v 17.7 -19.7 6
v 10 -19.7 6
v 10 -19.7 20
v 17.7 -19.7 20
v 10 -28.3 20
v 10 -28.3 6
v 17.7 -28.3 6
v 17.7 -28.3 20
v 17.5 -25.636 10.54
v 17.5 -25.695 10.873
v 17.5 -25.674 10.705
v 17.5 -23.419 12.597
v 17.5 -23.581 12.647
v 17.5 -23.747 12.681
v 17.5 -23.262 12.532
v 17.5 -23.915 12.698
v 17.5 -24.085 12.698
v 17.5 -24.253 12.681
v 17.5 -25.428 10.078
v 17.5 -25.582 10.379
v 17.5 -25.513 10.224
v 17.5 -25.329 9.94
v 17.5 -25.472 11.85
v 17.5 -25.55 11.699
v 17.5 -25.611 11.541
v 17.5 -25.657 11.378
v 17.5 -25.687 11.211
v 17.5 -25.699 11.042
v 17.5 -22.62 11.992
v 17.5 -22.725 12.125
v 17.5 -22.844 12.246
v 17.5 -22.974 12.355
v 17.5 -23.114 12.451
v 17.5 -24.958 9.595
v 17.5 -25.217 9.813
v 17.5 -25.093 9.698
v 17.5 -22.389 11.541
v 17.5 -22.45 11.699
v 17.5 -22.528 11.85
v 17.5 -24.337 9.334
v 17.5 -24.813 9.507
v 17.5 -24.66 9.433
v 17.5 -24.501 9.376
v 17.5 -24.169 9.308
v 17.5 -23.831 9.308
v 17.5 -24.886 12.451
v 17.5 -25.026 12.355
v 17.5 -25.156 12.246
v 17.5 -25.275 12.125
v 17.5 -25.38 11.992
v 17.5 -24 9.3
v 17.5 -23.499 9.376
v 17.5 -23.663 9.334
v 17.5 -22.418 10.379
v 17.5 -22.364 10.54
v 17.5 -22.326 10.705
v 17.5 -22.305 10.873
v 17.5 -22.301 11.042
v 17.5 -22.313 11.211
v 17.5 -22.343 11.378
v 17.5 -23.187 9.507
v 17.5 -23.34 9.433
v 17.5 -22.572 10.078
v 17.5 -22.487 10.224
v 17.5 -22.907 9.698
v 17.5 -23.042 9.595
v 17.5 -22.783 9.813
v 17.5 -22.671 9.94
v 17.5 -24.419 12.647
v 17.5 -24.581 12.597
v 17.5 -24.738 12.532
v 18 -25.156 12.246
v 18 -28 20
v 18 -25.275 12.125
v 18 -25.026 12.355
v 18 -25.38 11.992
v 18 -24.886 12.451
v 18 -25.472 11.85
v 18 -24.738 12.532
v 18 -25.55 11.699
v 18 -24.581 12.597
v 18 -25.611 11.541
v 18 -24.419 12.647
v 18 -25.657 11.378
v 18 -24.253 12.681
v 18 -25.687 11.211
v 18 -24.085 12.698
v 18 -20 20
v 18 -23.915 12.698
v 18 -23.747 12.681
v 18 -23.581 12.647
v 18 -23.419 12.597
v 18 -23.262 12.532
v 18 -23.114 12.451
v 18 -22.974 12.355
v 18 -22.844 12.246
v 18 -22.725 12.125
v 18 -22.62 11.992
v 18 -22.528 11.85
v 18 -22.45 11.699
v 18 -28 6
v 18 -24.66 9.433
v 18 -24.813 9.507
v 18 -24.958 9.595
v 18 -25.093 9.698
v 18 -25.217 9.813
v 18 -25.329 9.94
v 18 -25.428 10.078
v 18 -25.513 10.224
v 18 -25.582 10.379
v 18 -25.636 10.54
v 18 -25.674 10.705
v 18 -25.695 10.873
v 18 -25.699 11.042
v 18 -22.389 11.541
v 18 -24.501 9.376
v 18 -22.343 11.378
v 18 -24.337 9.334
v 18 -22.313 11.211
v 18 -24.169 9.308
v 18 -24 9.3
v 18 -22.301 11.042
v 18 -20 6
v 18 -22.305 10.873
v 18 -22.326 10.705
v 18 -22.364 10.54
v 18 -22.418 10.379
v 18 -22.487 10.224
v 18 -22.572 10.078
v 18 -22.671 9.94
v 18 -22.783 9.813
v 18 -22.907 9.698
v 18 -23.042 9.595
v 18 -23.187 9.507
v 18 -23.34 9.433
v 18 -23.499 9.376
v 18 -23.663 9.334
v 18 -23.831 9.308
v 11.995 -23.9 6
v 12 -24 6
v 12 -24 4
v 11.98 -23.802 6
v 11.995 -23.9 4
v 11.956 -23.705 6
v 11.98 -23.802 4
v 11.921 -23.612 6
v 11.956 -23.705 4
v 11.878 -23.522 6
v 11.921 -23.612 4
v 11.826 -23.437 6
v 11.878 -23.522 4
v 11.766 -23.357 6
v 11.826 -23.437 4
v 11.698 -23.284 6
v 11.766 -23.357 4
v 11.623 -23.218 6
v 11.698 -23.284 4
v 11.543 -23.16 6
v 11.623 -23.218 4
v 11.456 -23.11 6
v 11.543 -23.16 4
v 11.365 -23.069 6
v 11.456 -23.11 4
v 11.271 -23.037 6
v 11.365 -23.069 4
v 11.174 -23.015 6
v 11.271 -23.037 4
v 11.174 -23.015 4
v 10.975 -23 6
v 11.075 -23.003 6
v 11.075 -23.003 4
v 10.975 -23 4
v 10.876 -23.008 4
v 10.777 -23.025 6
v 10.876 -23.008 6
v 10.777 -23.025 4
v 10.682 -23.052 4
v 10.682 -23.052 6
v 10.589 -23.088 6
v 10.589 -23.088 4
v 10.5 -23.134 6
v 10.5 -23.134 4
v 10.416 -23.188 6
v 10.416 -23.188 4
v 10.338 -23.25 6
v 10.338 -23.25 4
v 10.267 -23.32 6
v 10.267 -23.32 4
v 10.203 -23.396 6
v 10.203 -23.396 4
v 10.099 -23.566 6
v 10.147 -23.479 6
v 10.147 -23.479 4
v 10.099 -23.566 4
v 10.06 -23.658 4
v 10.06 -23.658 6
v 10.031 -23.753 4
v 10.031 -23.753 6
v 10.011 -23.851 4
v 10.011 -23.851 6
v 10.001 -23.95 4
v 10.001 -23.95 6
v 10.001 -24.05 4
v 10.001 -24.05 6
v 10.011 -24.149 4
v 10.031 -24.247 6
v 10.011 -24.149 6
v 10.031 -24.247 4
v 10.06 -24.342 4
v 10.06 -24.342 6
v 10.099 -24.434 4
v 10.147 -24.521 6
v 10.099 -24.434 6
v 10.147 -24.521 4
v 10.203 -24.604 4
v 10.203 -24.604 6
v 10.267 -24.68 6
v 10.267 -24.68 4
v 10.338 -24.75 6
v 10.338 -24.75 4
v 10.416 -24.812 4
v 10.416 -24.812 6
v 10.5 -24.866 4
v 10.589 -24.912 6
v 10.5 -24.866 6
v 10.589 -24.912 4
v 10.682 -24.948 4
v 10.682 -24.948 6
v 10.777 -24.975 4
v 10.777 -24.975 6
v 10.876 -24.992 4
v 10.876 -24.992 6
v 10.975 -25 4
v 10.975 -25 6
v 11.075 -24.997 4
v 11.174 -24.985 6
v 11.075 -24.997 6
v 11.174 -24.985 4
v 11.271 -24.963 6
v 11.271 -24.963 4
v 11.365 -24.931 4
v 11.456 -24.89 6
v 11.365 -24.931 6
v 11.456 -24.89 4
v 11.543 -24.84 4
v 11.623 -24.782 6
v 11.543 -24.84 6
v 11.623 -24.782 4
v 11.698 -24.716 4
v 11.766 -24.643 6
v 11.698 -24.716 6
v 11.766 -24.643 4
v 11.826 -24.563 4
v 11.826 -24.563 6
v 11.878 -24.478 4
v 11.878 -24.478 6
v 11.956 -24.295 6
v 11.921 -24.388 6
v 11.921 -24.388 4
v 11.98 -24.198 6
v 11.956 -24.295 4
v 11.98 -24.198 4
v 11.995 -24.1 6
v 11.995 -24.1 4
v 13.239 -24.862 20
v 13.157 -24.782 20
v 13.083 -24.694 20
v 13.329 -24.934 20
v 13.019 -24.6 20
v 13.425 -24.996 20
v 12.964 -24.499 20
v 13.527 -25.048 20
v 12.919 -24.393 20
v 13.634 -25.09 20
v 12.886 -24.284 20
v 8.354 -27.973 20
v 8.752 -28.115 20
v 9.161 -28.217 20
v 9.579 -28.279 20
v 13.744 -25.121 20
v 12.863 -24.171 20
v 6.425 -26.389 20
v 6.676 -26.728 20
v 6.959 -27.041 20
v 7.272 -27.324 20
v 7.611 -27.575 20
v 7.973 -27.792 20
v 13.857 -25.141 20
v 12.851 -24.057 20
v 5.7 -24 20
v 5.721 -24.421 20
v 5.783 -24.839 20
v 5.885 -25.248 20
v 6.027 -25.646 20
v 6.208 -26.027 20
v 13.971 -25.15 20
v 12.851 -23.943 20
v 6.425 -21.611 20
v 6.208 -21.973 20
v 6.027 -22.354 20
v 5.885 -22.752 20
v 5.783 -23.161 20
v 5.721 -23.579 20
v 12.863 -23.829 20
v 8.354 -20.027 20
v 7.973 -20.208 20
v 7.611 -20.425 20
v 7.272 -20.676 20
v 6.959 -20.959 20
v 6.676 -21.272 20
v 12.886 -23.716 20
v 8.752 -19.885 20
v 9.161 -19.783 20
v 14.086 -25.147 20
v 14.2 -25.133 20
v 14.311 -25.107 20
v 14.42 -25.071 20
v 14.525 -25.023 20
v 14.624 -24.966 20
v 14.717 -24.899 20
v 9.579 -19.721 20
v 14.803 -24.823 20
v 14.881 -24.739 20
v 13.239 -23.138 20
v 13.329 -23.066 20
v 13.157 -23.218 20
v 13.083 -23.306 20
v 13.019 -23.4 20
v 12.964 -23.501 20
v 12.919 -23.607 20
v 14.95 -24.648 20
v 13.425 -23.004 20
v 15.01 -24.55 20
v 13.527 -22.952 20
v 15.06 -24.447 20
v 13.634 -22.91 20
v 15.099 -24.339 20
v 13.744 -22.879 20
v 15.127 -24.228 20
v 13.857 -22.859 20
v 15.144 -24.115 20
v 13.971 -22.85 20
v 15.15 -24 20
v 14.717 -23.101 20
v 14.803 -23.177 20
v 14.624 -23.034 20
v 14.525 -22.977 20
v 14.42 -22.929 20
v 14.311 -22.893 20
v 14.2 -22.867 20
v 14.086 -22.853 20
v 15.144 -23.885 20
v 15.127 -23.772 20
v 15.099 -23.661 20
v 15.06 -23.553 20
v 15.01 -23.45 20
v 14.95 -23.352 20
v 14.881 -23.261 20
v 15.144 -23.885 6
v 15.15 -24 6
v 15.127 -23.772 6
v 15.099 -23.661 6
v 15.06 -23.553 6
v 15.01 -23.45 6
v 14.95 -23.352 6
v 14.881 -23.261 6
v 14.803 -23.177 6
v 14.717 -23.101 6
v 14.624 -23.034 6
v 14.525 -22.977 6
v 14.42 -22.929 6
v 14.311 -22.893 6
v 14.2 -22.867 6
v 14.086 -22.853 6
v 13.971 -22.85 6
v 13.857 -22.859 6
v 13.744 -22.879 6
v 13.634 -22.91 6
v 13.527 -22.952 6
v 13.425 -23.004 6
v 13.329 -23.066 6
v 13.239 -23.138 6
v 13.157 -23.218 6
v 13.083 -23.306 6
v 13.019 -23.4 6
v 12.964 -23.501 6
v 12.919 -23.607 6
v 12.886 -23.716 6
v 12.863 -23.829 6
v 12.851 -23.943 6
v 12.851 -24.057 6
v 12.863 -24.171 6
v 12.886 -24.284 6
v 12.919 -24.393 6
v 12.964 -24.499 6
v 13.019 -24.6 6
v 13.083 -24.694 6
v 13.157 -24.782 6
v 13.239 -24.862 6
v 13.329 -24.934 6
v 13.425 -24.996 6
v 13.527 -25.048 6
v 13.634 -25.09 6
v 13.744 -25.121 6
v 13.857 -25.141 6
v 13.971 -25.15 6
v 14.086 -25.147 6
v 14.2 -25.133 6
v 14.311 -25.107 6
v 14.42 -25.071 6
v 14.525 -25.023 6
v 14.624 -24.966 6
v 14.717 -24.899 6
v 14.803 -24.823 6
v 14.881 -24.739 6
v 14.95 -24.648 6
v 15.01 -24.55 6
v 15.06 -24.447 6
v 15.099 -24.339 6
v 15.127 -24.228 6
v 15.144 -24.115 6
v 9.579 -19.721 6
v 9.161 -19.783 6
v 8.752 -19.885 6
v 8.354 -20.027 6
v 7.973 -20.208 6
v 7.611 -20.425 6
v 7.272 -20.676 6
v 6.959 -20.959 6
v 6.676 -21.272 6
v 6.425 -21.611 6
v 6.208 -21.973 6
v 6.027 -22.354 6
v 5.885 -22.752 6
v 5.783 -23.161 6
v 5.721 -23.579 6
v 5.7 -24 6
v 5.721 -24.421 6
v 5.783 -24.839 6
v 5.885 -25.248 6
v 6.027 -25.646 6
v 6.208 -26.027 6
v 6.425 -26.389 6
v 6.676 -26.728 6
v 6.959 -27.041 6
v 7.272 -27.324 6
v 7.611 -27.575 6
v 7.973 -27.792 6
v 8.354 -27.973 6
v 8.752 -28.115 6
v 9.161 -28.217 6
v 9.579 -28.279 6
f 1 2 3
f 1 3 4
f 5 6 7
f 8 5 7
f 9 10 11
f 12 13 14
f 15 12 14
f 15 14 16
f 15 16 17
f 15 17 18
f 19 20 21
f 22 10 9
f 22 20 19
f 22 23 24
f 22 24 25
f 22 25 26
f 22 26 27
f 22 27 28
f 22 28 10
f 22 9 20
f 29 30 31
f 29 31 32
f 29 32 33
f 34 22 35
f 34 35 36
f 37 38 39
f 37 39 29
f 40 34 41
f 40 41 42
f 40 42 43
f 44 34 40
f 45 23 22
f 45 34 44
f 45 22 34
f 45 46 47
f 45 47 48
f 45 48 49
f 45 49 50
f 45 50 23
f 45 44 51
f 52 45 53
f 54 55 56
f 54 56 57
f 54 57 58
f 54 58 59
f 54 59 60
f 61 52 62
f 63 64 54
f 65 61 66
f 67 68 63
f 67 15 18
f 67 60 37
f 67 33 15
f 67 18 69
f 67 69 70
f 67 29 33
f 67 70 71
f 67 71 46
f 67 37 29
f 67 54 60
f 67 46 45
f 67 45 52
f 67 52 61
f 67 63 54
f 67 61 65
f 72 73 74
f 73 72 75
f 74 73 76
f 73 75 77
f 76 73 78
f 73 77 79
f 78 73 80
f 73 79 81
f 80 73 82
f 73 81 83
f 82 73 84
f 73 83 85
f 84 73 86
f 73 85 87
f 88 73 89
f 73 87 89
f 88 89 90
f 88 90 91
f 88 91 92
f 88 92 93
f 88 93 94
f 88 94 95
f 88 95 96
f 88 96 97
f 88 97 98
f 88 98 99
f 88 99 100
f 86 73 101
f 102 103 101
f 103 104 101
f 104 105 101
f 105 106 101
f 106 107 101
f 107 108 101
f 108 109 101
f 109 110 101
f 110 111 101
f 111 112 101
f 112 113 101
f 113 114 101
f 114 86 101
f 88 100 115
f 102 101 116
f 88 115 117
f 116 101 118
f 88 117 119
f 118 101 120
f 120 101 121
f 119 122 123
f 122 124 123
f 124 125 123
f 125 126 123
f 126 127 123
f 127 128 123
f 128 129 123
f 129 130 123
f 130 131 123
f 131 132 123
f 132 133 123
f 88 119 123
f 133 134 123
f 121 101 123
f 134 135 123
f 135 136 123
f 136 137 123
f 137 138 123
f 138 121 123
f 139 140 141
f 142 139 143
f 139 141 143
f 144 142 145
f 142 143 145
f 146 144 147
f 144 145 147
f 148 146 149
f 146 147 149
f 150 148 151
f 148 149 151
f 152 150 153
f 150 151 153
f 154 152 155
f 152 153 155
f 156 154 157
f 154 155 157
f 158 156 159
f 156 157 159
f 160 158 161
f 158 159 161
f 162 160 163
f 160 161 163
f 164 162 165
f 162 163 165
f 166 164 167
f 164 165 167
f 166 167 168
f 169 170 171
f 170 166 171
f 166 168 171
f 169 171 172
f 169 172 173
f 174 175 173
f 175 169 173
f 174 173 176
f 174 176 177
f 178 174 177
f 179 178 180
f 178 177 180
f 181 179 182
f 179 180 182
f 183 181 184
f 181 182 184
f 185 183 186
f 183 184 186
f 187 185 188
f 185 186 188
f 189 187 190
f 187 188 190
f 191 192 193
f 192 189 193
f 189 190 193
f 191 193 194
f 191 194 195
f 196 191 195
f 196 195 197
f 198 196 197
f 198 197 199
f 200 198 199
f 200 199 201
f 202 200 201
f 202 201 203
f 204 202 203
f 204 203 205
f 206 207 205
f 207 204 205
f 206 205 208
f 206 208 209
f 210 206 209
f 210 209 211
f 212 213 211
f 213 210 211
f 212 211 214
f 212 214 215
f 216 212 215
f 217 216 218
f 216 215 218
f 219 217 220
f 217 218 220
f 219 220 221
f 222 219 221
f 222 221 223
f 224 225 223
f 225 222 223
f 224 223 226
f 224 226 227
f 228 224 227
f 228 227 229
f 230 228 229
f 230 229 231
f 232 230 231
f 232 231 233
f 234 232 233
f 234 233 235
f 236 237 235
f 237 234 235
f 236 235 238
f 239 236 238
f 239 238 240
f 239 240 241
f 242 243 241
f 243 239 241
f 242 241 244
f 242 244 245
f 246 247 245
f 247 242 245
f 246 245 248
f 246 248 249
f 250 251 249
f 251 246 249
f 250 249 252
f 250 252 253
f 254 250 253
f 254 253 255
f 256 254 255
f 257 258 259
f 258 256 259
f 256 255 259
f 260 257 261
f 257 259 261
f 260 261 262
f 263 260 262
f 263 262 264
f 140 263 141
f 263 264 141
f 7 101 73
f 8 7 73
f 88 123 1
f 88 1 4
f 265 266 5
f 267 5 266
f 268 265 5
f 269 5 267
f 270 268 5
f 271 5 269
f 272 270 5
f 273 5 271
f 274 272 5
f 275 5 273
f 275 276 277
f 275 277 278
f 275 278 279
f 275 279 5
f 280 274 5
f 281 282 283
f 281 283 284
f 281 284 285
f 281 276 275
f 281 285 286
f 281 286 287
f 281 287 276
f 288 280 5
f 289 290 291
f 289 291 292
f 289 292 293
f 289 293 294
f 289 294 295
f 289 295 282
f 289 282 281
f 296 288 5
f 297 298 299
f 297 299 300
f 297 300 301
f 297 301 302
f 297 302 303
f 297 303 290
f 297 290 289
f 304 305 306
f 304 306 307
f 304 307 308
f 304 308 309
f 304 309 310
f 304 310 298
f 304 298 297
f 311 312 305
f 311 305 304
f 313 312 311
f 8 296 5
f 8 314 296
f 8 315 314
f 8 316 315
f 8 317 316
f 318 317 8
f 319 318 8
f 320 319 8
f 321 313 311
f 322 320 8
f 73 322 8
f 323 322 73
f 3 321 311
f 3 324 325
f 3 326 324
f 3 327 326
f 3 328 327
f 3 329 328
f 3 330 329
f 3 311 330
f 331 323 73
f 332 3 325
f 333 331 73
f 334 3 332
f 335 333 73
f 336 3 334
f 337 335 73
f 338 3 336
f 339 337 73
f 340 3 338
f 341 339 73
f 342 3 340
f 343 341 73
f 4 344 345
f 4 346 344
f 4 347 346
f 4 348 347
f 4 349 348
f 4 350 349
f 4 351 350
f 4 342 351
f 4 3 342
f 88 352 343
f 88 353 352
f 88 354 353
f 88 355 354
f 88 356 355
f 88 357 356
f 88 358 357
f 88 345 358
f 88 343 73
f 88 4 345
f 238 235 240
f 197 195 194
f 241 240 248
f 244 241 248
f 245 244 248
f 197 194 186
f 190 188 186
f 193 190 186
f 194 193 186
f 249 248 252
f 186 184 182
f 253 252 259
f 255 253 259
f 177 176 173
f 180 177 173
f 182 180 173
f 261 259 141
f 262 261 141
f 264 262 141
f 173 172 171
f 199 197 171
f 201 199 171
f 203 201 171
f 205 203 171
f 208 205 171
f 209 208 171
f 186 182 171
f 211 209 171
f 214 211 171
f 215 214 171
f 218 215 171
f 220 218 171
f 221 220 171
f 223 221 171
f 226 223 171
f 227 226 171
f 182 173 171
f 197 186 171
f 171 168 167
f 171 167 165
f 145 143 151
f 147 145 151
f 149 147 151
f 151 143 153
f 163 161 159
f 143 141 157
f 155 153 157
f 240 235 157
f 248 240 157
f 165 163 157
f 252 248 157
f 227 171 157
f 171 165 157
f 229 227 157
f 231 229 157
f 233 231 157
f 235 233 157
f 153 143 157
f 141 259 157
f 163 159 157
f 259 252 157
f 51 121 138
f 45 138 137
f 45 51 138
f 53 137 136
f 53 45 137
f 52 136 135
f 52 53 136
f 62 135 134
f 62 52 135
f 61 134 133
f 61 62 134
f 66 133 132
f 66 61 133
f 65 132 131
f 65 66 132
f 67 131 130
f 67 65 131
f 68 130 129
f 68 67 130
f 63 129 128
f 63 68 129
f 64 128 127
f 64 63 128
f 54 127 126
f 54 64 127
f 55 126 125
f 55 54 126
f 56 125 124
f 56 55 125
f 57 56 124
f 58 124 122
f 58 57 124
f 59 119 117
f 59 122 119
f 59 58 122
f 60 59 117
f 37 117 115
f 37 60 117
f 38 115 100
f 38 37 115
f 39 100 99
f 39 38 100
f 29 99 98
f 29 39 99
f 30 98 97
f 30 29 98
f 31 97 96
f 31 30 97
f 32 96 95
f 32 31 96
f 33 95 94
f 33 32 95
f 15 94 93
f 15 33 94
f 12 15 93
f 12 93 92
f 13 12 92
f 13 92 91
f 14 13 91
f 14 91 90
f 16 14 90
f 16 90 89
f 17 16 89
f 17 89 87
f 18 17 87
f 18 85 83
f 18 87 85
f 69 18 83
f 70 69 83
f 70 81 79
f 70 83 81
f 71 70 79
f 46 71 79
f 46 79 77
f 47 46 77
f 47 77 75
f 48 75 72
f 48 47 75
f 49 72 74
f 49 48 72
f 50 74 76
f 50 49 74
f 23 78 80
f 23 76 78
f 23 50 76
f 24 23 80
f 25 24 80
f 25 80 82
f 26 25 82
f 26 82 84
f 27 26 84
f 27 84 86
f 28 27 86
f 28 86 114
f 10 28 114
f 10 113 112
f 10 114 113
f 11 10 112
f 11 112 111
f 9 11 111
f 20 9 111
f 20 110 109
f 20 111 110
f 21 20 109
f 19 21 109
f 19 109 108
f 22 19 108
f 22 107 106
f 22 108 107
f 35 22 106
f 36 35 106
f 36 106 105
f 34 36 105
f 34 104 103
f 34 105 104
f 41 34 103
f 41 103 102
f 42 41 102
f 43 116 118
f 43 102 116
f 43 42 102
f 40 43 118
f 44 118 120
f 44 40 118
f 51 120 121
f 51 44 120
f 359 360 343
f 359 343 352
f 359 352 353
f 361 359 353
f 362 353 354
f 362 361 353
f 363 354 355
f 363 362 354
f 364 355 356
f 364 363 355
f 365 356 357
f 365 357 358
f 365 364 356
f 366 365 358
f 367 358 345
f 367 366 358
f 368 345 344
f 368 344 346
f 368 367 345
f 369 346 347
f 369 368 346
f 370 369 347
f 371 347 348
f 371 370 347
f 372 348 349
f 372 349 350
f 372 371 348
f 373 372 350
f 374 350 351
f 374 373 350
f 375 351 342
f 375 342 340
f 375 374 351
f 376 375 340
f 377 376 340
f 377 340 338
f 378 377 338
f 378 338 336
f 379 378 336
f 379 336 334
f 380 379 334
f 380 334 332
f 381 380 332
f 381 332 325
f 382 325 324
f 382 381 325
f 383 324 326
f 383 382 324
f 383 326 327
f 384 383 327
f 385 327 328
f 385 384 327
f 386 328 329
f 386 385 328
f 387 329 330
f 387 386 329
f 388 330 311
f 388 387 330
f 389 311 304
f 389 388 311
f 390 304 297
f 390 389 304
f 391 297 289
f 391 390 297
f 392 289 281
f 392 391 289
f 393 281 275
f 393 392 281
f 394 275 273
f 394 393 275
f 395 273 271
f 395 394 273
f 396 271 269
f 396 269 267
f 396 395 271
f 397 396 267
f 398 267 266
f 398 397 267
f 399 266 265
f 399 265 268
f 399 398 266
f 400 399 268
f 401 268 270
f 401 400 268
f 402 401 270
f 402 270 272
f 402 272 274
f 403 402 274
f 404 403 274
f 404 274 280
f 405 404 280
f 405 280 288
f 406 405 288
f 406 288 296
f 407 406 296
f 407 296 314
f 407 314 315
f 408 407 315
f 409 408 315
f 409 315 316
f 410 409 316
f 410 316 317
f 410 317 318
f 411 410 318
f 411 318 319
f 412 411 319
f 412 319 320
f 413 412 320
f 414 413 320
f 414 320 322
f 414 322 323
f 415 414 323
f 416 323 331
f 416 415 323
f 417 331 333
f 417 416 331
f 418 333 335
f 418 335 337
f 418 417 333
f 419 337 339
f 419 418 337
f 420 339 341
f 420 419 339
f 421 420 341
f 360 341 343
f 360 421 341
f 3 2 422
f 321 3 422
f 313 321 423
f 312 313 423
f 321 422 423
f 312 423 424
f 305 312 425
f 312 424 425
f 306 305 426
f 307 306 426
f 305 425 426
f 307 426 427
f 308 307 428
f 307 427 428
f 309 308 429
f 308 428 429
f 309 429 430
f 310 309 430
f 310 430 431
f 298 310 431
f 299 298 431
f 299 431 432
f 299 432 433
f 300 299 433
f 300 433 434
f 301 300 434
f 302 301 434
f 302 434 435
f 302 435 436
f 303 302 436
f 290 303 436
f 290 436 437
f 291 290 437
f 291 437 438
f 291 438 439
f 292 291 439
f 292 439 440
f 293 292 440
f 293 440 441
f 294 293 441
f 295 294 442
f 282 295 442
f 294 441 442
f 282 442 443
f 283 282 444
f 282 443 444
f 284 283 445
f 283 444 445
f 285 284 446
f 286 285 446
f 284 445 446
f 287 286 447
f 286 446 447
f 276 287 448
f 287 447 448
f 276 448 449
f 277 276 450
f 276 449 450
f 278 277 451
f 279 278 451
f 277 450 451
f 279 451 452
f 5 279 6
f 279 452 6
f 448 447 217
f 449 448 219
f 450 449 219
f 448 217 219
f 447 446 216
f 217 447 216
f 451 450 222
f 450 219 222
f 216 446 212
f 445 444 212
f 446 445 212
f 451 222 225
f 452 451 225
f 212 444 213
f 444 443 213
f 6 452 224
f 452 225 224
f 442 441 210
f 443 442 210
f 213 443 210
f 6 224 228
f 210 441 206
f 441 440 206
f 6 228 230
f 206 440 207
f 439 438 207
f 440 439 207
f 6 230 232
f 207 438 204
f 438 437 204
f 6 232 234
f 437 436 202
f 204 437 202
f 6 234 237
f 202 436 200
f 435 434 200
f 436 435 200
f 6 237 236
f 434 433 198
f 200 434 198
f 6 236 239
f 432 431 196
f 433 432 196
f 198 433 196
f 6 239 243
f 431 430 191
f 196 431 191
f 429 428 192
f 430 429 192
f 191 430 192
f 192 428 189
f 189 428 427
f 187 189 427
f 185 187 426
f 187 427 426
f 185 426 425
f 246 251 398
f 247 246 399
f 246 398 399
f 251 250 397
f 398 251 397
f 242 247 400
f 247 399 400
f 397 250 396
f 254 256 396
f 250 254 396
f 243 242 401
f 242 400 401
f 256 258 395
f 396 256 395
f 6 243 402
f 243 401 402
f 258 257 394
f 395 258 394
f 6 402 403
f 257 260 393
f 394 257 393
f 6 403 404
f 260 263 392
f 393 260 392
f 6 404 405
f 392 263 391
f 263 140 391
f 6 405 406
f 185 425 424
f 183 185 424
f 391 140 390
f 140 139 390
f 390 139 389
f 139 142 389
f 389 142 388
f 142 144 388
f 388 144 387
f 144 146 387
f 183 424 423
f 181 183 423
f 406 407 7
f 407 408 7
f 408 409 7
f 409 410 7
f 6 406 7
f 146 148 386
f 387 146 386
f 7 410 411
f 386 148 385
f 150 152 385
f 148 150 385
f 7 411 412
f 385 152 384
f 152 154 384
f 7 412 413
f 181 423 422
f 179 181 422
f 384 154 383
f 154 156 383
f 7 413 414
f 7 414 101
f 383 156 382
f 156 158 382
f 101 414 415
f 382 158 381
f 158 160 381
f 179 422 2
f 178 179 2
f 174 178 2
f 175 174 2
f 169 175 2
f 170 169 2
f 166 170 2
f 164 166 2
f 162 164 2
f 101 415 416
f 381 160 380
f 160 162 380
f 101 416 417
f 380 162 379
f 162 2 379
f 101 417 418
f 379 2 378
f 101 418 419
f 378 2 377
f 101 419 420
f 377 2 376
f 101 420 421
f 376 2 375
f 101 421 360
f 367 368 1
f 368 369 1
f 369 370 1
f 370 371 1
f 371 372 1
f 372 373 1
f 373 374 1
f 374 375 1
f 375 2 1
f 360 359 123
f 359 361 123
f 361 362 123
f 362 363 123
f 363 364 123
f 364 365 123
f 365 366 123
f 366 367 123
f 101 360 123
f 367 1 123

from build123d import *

# Parameters (mm, degrees)
CYLINDER112024025003003006010004028_R     = 1.7
CYLINDER112024025003003006010004028_DEPTH = 14
CYLINDER112024025003003006010004021_R     = 1.15
CYLINDER112024025003003006010004021_DEPTH = 14
CYLINDER112024025003003006010004027_R     = 4.3
CYLINDER112024025003003006010004027_DEPTH = 14
CYLINDER112024025003003006010004043_R     = 1
CYLINDER112024025003003006010004043_DEPTH = 14
BOX021079_W                               = 8
BOX021079_H                               = 8.6
BOX021079_DEPTH                           = 14
CHAMFER008_SIZE                           = 0.3


with BuildPart() as v_lec199:
    # Cylinder112024025003003006010004028 → Cylinder112024025003003006010004028 (new body)
    with BuildSketch(Plane(origin=(17.5, -24, 11), x_dir=(0, 0, -1), z_dir=(1, 0, 0))):
        Circle(CYLINDER112024025003003006010004028_R)
    extrude(amount=CYLINDER112024025003003006010004028_DEPTH)


with BuildPart() as fusion005043005007002015:
    # Cylinder112024025003003006010004021 → Cylinder112024025003003006010004021 (new body)
    with BuildSketch(Plane(origin=(14, -24, 6), x_dir=(1, 0, 0), z_dir=(0, 0, 1))):
        Circle(CYLINDER112024025003003006010004021_R)
    extrude(amount=CYLINDER112024025003003006010004021_DEPTH)

    # Fusion005043005007002015: union Válec199
    add(v_lec199.part)


with BuildPart() as v_lec198:
    # Cylinder112024025003003006010004027 → Cylinder112024025003003006010004027 (new body)
    with BuildSketch(Plane(origin=(10, -24, 6), x_dir=(1, 0, 0), z_dir=(0, 0, 1))):
        Circle(CYLINDER112024025003003006010004027_R)
    extrude(amount=CYLINDER112024025003003006010004027_DEPTH)


with BuildPart() as v_lec214:
    # Cylinder112024025003003006010004043 → Cylinder112024025003003006010004043 (new body)
    with BuildSketch(Plane(origin=(11, -24, 4), x_dir=(1, 0, 0), z_dir=(0, 0, 1))):
        Circle(CYLINDER112024025003003006010004043_R)
    extrude(amount=CYLINDER112024025003003006010004043_DEPTH)


with BuildPart() as tensioner:
    # Box021079 → Box021079 (new body)
    with BuildSketch(Plane(origin=(10, -28.3, 6), x_dir=(1, 0, 0), z_dir=(0, 0, 1))):
        with Locations((4, 4.3)):
            Rectangle(BOX021079_W, BOX021079_H)
    extrude(amount=BOX021079_DEPTH)

    # Fusion005043005007002014: union Válec198, Válec214
    add(v_lec198.part)
    add(v_lec214.part)

    # Cut018020020009027020002003004004013: cut Fusion005043005007002015
    add(fusion005043005007002015.part, mode=Mode.SUBTRACT)

    # Chamfer008
    chamfer008_edges = [tensioner.edges().sort_by_distance(p)[0] for p in [
        (18, -28.3, 13),
        (18, -19.7, 13),
    ]]
    chamfer(chamfer008_edges, length=CHAMFER008_SIZE)


solid = tensioner.part
